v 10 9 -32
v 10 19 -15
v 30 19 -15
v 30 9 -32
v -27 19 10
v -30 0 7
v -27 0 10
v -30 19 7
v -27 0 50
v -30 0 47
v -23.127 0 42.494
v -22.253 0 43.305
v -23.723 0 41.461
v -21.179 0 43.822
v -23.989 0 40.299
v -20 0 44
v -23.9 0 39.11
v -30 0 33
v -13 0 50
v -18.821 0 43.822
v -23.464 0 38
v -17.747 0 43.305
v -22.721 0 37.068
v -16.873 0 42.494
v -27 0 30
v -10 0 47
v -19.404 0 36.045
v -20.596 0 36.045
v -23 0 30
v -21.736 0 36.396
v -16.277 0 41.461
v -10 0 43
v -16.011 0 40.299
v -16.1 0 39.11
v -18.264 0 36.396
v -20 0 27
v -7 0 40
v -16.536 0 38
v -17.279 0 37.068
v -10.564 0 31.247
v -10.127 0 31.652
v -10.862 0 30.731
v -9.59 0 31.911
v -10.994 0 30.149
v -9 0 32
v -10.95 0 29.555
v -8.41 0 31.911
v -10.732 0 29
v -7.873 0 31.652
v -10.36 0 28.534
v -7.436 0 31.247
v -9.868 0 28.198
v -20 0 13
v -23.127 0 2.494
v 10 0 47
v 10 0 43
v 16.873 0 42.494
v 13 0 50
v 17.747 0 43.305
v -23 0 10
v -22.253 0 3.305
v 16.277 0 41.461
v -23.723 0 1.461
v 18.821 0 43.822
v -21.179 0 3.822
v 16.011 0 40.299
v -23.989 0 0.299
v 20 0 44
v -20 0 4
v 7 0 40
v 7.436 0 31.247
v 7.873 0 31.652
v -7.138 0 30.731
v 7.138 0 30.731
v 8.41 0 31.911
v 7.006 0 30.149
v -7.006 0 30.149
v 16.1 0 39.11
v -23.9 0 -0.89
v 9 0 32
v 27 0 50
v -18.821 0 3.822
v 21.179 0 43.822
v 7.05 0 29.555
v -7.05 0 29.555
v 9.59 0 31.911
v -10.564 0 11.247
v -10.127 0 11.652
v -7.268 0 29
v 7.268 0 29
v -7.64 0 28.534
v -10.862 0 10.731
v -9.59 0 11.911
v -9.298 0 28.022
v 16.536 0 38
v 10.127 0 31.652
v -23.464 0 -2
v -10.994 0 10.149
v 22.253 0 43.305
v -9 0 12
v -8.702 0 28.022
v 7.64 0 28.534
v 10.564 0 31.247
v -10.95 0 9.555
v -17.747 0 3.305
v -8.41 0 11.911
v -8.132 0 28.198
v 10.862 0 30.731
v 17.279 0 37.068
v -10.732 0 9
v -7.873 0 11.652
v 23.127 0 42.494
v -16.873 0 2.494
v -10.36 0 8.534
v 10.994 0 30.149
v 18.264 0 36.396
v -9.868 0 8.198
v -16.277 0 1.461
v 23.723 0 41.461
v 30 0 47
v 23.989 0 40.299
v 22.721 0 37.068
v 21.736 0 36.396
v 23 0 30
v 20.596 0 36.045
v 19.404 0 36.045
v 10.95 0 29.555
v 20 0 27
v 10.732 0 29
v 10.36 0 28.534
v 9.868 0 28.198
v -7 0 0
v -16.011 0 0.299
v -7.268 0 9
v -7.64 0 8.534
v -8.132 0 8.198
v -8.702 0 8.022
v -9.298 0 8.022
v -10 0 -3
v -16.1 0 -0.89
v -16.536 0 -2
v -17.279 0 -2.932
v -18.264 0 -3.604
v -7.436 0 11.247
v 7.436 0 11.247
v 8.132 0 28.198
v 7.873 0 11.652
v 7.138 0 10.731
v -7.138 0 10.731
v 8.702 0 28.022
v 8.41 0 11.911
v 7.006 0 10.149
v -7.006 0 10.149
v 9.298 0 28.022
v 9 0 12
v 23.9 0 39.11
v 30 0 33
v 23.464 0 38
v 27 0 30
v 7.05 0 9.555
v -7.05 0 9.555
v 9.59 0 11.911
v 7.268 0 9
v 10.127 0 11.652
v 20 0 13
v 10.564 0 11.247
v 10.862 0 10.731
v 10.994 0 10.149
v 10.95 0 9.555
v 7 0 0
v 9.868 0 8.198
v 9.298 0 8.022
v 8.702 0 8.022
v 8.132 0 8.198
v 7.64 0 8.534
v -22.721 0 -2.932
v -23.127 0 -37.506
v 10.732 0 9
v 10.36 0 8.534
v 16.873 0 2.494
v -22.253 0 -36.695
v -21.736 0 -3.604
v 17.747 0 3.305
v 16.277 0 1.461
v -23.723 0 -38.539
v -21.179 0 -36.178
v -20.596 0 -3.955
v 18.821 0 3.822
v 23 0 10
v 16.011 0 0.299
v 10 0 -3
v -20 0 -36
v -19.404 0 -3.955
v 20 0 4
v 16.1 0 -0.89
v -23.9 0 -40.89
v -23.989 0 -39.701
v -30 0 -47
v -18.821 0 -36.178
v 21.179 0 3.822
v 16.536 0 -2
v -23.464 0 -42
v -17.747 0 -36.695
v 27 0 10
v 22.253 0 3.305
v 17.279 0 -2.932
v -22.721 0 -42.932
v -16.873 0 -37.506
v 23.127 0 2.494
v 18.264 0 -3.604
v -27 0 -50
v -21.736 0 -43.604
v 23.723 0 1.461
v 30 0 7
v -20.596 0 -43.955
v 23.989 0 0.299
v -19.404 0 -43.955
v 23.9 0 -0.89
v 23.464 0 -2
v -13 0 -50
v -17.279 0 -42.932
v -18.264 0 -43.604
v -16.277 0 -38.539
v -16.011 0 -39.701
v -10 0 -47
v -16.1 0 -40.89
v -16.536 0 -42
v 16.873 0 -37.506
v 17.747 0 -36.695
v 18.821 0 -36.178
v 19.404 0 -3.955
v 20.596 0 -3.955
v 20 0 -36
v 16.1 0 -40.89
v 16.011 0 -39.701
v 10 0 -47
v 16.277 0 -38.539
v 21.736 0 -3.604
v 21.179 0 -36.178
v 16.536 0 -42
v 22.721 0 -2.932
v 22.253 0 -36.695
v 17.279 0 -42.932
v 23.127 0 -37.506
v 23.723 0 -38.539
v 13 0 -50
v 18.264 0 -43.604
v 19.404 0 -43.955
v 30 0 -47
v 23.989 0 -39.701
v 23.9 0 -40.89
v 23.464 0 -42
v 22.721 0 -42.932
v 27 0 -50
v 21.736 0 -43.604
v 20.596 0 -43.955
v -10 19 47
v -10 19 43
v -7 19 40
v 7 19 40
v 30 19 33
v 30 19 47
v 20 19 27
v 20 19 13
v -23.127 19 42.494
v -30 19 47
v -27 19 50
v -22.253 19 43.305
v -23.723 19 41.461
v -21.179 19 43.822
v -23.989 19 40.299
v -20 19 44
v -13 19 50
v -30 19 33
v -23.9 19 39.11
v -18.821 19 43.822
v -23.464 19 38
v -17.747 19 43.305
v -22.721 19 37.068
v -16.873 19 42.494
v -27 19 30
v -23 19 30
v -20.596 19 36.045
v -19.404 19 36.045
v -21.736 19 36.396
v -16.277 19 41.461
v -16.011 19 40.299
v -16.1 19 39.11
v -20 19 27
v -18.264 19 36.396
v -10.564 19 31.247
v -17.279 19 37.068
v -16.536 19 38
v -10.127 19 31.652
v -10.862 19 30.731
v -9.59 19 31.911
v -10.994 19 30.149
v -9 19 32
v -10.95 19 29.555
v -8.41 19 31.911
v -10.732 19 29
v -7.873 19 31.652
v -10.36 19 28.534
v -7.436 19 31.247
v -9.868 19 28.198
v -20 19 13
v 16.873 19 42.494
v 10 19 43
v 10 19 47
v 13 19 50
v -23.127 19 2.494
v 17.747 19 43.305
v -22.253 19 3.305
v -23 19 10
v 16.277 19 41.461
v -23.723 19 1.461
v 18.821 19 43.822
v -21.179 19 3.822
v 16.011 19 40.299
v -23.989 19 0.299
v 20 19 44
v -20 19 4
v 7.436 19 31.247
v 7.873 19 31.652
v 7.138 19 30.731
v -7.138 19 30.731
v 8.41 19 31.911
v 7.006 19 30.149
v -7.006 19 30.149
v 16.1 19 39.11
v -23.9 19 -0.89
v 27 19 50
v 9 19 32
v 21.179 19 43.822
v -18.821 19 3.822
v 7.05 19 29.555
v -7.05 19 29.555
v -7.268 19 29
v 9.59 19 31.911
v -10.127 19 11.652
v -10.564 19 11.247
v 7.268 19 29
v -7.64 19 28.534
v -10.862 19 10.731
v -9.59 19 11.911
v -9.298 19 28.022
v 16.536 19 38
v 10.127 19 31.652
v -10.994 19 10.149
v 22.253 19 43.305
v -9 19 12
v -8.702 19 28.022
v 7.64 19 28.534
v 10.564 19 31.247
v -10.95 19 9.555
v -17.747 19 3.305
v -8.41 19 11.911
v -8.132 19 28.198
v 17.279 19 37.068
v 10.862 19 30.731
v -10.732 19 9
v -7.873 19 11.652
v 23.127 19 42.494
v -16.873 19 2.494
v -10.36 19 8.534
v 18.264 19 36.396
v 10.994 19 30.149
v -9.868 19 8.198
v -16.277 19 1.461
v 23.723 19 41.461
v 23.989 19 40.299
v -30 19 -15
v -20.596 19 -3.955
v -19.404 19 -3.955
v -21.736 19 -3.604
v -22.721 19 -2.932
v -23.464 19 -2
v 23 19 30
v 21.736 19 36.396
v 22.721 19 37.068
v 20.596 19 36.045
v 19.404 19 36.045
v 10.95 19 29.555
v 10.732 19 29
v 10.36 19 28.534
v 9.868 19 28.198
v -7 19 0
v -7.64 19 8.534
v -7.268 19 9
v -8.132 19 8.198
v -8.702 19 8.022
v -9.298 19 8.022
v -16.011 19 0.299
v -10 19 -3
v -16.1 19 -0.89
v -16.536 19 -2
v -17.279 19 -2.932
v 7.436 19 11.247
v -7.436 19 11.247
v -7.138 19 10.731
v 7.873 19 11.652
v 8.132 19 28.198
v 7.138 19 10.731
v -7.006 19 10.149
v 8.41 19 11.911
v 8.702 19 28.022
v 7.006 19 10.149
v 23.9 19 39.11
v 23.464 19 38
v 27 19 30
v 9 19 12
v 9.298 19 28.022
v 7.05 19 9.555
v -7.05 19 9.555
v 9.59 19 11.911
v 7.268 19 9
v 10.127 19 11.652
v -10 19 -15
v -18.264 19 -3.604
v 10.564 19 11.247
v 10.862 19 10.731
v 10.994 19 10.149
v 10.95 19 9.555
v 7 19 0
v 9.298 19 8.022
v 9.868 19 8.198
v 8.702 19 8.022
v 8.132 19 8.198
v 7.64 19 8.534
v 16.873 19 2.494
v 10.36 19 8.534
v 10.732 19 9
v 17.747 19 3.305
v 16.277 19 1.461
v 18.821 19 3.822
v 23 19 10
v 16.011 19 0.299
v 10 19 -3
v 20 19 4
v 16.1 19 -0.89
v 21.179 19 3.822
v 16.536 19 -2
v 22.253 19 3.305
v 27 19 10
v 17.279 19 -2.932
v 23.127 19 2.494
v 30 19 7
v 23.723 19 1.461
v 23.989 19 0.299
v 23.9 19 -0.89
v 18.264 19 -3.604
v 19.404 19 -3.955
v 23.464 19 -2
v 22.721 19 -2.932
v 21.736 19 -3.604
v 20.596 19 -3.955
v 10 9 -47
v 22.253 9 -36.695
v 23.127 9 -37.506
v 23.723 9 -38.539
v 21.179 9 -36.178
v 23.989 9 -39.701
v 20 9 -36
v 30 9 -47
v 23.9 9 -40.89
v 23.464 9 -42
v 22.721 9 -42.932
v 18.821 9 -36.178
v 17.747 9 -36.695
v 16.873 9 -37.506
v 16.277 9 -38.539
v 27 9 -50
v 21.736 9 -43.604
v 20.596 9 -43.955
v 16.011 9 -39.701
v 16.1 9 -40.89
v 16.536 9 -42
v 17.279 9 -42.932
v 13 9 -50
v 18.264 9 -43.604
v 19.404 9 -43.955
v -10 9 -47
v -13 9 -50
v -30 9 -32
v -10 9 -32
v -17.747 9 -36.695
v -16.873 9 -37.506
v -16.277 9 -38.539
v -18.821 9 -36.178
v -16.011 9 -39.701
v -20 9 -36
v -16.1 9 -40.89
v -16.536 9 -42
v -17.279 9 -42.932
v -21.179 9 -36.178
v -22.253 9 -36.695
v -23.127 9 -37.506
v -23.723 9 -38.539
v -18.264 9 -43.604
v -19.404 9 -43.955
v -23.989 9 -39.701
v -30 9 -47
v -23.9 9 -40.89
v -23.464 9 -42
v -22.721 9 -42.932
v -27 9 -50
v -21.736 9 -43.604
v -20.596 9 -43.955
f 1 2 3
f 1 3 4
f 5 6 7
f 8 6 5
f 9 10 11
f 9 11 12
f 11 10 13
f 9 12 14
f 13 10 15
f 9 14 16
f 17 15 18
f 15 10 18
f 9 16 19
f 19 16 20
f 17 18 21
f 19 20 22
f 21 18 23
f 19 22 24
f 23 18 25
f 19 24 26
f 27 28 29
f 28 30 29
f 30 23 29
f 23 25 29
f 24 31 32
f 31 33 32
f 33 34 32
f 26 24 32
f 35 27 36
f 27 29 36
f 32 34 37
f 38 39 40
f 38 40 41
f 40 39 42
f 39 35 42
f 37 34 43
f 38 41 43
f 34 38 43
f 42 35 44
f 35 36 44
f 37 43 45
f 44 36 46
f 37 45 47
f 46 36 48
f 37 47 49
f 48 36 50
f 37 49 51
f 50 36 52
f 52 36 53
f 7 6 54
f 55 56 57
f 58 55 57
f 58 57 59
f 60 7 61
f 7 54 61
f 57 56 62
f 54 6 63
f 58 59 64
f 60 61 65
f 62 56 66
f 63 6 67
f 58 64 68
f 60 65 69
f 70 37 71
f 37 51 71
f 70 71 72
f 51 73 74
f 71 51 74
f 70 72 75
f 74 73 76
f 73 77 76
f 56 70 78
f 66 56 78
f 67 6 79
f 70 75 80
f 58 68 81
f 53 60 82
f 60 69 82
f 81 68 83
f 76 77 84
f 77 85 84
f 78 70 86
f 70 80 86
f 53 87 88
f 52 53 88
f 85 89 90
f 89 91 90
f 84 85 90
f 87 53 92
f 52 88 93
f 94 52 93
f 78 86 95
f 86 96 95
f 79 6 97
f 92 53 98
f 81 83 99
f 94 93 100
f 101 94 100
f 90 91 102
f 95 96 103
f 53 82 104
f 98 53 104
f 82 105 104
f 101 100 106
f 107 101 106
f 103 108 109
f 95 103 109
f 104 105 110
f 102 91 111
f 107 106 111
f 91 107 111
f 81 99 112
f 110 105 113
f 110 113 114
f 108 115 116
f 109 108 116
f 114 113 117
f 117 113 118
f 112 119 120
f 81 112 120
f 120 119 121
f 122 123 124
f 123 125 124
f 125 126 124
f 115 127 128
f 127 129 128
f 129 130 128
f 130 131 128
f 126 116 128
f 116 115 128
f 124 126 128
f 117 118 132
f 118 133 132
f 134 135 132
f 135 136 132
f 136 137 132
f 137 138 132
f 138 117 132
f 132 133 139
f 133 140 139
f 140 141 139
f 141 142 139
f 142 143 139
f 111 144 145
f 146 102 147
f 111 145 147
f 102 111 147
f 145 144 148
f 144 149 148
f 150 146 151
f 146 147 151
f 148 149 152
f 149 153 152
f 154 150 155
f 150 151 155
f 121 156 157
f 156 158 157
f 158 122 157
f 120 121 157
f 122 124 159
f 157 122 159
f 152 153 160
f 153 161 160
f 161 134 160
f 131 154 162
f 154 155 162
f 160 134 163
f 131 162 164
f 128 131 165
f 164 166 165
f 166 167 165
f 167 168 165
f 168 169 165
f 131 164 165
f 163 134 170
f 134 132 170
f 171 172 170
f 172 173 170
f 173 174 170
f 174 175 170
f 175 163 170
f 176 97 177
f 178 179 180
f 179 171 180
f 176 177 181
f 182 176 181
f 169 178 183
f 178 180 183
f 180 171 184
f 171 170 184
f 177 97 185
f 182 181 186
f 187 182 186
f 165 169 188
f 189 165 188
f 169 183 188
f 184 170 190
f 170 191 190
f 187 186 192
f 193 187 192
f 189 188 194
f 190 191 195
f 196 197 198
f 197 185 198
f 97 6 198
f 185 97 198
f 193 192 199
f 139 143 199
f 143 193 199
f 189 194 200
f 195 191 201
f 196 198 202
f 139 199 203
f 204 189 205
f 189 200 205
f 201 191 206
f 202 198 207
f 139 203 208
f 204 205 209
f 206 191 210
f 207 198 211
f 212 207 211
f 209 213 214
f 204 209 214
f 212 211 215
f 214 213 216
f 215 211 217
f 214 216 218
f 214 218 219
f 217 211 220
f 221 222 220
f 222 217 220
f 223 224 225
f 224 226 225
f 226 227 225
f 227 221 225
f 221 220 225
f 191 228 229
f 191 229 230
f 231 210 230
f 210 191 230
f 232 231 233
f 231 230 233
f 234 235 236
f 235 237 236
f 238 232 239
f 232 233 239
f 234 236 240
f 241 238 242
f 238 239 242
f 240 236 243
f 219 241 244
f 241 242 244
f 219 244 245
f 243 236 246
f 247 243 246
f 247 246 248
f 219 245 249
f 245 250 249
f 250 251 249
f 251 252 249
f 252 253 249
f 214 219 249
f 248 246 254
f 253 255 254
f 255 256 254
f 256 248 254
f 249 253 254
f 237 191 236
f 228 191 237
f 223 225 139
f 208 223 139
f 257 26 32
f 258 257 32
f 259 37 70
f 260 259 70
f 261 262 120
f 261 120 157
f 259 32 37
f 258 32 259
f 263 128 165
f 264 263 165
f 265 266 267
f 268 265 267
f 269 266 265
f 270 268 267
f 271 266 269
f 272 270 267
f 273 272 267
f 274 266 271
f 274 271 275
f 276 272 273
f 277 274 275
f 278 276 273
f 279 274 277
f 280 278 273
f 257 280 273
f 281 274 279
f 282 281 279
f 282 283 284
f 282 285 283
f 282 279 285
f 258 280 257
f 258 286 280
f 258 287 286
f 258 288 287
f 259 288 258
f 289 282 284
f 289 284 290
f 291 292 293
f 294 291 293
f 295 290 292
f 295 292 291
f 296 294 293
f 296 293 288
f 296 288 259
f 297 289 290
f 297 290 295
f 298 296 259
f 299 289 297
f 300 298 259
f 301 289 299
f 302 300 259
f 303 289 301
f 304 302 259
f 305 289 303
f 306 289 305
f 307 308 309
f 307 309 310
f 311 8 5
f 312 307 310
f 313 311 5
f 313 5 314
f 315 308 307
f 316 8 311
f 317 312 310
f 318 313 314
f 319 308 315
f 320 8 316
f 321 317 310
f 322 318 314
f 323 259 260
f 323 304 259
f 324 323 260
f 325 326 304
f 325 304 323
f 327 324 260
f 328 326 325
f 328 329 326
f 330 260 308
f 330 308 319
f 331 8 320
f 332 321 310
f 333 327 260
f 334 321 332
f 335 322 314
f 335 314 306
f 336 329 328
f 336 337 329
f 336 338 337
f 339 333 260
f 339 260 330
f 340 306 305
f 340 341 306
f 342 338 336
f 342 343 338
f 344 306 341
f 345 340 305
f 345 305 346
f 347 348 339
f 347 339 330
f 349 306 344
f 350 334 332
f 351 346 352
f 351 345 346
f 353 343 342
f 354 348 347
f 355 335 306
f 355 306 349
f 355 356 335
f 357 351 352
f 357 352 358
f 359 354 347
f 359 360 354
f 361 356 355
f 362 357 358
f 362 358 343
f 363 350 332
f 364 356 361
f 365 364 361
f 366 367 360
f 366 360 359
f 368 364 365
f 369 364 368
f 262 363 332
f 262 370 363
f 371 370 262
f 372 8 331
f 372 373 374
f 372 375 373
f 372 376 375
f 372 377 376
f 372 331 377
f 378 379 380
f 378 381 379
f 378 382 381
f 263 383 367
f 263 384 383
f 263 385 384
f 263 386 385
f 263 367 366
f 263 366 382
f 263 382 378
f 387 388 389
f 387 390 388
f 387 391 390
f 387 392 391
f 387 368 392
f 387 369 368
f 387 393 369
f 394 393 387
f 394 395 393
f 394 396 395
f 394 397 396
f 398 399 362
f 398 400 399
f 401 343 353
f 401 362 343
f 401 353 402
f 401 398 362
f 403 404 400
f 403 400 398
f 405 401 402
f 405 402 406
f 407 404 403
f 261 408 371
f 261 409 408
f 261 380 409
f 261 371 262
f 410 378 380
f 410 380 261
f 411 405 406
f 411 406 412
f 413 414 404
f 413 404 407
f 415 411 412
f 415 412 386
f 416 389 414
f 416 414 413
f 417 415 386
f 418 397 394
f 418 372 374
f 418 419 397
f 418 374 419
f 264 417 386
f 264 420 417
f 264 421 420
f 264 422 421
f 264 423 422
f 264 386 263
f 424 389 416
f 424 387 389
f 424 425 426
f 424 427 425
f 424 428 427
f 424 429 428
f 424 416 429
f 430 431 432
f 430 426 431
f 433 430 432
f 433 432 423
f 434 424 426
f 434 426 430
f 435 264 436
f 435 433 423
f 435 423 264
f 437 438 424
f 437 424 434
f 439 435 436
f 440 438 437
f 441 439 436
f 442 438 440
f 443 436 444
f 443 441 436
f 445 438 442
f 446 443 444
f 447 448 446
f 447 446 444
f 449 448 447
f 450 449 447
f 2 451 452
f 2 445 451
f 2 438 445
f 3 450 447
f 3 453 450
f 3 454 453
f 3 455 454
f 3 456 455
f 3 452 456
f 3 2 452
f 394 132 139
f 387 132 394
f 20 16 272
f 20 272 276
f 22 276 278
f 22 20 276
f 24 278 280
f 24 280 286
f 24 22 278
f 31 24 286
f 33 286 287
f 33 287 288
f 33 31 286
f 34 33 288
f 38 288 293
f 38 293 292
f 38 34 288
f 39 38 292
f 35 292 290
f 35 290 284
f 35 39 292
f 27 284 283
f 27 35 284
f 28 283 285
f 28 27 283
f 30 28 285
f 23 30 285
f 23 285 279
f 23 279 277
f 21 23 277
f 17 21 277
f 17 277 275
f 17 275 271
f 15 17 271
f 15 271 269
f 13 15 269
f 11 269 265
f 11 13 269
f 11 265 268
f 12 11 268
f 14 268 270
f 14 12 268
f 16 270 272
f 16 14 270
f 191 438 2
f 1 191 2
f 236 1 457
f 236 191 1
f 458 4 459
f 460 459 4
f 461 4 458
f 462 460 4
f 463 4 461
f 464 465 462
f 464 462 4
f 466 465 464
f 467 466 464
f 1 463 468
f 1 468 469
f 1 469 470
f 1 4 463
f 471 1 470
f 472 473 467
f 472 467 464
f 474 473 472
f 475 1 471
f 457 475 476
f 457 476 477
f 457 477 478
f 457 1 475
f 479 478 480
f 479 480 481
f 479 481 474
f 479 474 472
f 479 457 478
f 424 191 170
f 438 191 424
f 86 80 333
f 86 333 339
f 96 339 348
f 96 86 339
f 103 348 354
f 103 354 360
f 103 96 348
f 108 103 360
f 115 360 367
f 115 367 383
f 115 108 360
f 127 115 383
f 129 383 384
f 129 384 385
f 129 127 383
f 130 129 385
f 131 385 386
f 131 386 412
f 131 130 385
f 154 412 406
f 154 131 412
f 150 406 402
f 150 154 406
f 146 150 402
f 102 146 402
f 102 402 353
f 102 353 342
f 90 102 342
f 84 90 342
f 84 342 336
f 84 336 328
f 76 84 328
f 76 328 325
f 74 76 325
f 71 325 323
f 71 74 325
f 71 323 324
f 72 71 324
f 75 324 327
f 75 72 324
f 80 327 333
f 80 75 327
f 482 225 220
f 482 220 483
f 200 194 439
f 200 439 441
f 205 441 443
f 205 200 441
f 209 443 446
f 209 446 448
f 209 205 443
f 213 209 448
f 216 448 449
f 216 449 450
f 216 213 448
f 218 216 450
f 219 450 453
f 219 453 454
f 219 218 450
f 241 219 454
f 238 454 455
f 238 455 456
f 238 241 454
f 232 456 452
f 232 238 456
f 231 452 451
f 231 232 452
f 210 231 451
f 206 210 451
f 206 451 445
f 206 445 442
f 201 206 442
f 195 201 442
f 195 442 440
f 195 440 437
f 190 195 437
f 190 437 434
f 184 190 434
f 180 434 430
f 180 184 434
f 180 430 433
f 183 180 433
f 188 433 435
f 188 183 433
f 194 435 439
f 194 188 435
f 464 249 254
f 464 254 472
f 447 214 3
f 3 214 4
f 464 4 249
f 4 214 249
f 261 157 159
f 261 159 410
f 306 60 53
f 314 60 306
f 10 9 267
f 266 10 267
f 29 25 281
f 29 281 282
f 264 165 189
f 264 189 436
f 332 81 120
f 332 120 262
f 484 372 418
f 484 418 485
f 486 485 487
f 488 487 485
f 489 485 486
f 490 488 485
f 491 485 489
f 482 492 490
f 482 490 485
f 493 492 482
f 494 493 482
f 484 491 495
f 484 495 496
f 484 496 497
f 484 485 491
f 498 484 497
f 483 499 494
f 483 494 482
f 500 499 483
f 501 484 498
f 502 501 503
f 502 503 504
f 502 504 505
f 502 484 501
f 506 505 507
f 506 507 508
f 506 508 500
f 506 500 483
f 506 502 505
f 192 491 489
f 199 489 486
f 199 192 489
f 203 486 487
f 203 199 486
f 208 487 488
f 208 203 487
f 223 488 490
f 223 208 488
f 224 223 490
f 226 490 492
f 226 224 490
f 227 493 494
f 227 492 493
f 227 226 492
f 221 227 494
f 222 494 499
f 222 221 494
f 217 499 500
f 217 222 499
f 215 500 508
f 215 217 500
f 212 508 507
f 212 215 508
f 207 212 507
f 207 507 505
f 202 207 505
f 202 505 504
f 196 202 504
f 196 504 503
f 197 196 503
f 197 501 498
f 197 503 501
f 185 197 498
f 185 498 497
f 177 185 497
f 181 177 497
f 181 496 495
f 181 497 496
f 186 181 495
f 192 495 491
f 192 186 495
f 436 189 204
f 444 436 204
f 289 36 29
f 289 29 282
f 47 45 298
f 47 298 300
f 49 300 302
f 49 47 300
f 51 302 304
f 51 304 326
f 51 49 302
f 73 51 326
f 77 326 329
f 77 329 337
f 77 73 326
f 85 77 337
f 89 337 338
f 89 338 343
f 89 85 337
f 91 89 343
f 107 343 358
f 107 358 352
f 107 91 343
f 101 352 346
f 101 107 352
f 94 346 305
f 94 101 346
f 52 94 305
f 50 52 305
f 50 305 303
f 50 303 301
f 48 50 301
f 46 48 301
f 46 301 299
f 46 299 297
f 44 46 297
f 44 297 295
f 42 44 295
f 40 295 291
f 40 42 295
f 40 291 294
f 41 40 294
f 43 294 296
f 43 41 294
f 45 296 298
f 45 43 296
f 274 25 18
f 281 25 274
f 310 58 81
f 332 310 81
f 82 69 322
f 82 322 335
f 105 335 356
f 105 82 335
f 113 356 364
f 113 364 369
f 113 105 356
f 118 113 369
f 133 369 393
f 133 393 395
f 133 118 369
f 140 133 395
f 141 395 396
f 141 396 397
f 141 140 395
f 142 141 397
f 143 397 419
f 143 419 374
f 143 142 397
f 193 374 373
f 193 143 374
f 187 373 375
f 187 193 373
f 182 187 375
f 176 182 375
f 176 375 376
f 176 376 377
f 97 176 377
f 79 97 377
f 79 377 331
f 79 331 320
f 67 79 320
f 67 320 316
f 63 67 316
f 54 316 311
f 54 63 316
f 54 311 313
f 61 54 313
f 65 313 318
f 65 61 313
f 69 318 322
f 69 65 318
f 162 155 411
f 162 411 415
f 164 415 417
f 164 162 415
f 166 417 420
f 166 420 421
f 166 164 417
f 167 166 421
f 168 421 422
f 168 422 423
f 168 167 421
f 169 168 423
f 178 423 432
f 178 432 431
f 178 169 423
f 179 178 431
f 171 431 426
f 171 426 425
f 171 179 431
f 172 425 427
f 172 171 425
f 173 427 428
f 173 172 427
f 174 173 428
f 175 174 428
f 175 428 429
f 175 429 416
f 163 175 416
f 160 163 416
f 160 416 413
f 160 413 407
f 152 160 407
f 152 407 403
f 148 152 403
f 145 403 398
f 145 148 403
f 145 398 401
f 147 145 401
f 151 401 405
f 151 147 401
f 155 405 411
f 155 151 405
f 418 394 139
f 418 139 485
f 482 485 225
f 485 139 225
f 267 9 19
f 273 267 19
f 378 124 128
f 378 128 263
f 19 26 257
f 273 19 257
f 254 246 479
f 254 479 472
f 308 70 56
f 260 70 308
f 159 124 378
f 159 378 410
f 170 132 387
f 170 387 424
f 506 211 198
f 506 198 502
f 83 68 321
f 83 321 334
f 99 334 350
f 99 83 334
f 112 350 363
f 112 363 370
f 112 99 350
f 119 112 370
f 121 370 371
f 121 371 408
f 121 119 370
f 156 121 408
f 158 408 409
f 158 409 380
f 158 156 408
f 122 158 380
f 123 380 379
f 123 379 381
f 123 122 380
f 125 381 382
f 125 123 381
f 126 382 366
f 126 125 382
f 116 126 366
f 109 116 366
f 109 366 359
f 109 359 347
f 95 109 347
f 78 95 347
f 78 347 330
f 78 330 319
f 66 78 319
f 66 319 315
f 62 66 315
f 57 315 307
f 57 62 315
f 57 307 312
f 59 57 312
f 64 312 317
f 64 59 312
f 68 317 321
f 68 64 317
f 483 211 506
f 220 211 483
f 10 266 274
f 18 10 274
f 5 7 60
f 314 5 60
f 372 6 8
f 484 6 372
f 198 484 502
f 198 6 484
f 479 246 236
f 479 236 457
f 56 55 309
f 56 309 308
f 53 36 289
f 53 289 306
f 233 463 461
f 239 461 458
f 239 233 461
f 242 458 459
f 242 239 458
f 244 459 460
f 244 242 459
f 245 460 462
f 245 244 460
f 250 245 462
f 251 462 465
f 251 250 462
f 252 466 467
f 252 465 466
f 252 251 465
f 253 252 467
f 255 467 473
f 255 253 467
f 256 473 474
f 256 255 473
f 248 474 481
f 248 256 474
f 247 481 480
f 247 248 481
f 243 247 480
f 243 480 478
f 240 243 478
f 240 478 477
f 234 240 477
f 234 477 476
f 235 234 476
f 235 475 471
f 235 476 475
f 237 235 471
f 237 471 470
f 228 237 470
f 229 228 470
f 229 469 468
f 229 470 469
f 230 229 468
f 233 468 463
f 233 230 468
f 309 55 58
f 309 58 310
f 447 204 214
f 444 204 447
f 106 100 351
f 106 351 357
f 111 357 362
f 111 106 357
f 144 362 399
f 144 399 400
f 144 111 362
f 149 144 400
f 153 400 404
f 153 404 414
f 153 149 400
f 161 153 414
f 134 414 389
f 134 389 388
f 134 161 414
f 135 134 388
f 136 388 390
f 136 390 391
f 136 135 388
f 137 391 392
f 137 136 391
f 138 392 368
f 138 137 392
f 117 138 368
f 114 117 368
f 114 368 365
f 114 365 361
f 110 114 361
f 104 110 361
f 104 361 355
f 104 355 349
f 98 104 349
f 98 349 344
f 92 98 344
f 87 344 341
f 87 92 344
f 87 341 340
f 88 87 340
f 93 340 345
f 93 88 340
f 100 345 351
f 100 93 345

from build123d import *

# Parameters (mm, degrees)
SKETCH_1_W               = 60
SKETCH_1_H               = 100
SKETCH_1_R               = 4
SKETCH_1_R_2             = 2
EXTRUDE_1_DEPTH          = 19
SKETCH_3_W               = 20
SKETCH_3_H               = 50
SKETCH_3_H_2             = 10
SKETCH_3_W_2             = 10
SKETCH_3_H_3             = 20
CUT_EXTRUDE_1_DEPTH      = 62.326992426
CHAMFER_1_SIZE           = 3
CUT_EXTRUDE_2_DEPTH      = 62.326992426
CUT_EXTRUDE_2_DEPTH_BACK = 62.326992426


with BuildPart() as part:
    # 草图1 → 凸台-拉伸1 (new body)
    with BuildSketch(Plane(origin=(0, 0, 0), x_dir=(1, 0, 0), z_dir=(0, 1, 0))):
        Rectangle(SKETCH_1_W, SKETCH_1_H)
        with Locations(Location((-20, 0, 0), (0, 0, 270))):
            Circle(SKETCH_1_R, mode=Mode.SUBTRACT)
        with Locations(Location((20, 0, 0), (0, 0, 270))):
            Circle(SKETCH_1_R, mode=Mode.SUBTRACT)
        with Locations(Location((-20, -40, 0), (0, 0, 270))):
            Circle(SKETCH_1_R, mode=Mode.SUBTRACT)
        with Locations(Location((20, -40, 0), (0, 0, 270))):
            Circle(SKETCH_1_R, mode=Mode.SUBTRACT)
        with Locations(Location((-20, 40, 0), (0, 0, 270))):
            Circle(SKETCH_1_R, mode=Mode.SUBTRACT)
        with Locations(Location((20, 40, 0), (0, 0, 270))):
            Circle(SKETCH_1_R, mode=Mode.SUBTRACT)
        with Locations(Location((-9, -30, 0), (0, 0, 270))):
            Circle(SKETCH_1_R_2, mode=Mode.SUBTRACT)
        with Locations(Location((9, -30, 0), (0, 0, 270))):
            Circle(SKETCH_1_R_2, mode=Mode.SUBTRACT)
        with Locations(Location((-9, -10, 0), (0, 0, 270))):
            Circle(SKETCH_1_R_2, mode=Mode.SUBTRACT)
        with Locations(Location((9, -10, 0), (0, 0, 270))):
            Circle(SKETCH_1_R_2, mode=Mode.SUBTRACT)
    extrude(amount=EXTRUDE_1_DEPTH)

    # 草图3 → 切除-拉伸1 (cut, through all)
    with BuildSketch(Plane(origin=(0, 0, 0), x_dir=(1, 0, 0), z_dir=(0, 1, 0))):
        with Locations((0, 25)):
            Rectangle(SKETCH_3_W, SKETCH_3_H)
        with Locations((0, -45)):
            Rectangle(SKETCH_3_W, SKETCH_3_H_2)
        with Locations((-25, -20)):
            Rectangle(SKETCH_3_W_2, SKETCH_3_H_3)
        with Locations((25, -20)):
            Rectangle(SKETCH_3_W_2, SKETCH_3_H_3)
    extrude(amount=CUT_EXTRUDE_1_DEPTH, mode=Mode.SUBTRACT)

    # 倒角1
    chamfer_1_edges = [part.edges().sort_by_distance(p)[0] for p in [
        (-10, 9.5, -50),
        (-10, 9.5, 0),
        (10, 9.5, 0),
        (10, 9.5, -50),
        (-30, 9.5, -50),
        (30, 9.5, -50),
        (-10, 9.5, 40),
        (-10, 9.5, 50),
        (30, 9.5, 50),
        (10, 9.5, 50),
        (10, 9.5, 40),
        (-30, 9.5, 50),
        (-30, 9.5, 10),
        (-30, 9.5, 30),
        (-20, 9.5, 30),
        (-20, 9.5, 10),
        (30, 9.5, 30),
        (30, 9.5, 10),
        (20, 9.5, 10),
        (20, 9.5, 30),
    ]]
    chamfer(chamfer_1_edges, length=CHAMFER_1_SIZE)

    # 草图4 → 切除-拉伸2 (cut, two sides: drawn at the far end of the back side and taken through both)
    with BuildSketch(Plane(origin=(0, 0, 0), x_dir=(0, 0, -1), z_dir=(1, 0, 0)).offset(-CUT_EXTRUDE_2_DEPTH_BACK)):
        Polygon((15, 19), (32, 9), (50, 9), (50, 19), align=None)
    extrude(amount=CUT_EXTRUDE_2_DEPTH + CUT_EXTRUDE_2_DEPTH_BACK, mode=Mode.SUBTRACT)


solid = part.part
